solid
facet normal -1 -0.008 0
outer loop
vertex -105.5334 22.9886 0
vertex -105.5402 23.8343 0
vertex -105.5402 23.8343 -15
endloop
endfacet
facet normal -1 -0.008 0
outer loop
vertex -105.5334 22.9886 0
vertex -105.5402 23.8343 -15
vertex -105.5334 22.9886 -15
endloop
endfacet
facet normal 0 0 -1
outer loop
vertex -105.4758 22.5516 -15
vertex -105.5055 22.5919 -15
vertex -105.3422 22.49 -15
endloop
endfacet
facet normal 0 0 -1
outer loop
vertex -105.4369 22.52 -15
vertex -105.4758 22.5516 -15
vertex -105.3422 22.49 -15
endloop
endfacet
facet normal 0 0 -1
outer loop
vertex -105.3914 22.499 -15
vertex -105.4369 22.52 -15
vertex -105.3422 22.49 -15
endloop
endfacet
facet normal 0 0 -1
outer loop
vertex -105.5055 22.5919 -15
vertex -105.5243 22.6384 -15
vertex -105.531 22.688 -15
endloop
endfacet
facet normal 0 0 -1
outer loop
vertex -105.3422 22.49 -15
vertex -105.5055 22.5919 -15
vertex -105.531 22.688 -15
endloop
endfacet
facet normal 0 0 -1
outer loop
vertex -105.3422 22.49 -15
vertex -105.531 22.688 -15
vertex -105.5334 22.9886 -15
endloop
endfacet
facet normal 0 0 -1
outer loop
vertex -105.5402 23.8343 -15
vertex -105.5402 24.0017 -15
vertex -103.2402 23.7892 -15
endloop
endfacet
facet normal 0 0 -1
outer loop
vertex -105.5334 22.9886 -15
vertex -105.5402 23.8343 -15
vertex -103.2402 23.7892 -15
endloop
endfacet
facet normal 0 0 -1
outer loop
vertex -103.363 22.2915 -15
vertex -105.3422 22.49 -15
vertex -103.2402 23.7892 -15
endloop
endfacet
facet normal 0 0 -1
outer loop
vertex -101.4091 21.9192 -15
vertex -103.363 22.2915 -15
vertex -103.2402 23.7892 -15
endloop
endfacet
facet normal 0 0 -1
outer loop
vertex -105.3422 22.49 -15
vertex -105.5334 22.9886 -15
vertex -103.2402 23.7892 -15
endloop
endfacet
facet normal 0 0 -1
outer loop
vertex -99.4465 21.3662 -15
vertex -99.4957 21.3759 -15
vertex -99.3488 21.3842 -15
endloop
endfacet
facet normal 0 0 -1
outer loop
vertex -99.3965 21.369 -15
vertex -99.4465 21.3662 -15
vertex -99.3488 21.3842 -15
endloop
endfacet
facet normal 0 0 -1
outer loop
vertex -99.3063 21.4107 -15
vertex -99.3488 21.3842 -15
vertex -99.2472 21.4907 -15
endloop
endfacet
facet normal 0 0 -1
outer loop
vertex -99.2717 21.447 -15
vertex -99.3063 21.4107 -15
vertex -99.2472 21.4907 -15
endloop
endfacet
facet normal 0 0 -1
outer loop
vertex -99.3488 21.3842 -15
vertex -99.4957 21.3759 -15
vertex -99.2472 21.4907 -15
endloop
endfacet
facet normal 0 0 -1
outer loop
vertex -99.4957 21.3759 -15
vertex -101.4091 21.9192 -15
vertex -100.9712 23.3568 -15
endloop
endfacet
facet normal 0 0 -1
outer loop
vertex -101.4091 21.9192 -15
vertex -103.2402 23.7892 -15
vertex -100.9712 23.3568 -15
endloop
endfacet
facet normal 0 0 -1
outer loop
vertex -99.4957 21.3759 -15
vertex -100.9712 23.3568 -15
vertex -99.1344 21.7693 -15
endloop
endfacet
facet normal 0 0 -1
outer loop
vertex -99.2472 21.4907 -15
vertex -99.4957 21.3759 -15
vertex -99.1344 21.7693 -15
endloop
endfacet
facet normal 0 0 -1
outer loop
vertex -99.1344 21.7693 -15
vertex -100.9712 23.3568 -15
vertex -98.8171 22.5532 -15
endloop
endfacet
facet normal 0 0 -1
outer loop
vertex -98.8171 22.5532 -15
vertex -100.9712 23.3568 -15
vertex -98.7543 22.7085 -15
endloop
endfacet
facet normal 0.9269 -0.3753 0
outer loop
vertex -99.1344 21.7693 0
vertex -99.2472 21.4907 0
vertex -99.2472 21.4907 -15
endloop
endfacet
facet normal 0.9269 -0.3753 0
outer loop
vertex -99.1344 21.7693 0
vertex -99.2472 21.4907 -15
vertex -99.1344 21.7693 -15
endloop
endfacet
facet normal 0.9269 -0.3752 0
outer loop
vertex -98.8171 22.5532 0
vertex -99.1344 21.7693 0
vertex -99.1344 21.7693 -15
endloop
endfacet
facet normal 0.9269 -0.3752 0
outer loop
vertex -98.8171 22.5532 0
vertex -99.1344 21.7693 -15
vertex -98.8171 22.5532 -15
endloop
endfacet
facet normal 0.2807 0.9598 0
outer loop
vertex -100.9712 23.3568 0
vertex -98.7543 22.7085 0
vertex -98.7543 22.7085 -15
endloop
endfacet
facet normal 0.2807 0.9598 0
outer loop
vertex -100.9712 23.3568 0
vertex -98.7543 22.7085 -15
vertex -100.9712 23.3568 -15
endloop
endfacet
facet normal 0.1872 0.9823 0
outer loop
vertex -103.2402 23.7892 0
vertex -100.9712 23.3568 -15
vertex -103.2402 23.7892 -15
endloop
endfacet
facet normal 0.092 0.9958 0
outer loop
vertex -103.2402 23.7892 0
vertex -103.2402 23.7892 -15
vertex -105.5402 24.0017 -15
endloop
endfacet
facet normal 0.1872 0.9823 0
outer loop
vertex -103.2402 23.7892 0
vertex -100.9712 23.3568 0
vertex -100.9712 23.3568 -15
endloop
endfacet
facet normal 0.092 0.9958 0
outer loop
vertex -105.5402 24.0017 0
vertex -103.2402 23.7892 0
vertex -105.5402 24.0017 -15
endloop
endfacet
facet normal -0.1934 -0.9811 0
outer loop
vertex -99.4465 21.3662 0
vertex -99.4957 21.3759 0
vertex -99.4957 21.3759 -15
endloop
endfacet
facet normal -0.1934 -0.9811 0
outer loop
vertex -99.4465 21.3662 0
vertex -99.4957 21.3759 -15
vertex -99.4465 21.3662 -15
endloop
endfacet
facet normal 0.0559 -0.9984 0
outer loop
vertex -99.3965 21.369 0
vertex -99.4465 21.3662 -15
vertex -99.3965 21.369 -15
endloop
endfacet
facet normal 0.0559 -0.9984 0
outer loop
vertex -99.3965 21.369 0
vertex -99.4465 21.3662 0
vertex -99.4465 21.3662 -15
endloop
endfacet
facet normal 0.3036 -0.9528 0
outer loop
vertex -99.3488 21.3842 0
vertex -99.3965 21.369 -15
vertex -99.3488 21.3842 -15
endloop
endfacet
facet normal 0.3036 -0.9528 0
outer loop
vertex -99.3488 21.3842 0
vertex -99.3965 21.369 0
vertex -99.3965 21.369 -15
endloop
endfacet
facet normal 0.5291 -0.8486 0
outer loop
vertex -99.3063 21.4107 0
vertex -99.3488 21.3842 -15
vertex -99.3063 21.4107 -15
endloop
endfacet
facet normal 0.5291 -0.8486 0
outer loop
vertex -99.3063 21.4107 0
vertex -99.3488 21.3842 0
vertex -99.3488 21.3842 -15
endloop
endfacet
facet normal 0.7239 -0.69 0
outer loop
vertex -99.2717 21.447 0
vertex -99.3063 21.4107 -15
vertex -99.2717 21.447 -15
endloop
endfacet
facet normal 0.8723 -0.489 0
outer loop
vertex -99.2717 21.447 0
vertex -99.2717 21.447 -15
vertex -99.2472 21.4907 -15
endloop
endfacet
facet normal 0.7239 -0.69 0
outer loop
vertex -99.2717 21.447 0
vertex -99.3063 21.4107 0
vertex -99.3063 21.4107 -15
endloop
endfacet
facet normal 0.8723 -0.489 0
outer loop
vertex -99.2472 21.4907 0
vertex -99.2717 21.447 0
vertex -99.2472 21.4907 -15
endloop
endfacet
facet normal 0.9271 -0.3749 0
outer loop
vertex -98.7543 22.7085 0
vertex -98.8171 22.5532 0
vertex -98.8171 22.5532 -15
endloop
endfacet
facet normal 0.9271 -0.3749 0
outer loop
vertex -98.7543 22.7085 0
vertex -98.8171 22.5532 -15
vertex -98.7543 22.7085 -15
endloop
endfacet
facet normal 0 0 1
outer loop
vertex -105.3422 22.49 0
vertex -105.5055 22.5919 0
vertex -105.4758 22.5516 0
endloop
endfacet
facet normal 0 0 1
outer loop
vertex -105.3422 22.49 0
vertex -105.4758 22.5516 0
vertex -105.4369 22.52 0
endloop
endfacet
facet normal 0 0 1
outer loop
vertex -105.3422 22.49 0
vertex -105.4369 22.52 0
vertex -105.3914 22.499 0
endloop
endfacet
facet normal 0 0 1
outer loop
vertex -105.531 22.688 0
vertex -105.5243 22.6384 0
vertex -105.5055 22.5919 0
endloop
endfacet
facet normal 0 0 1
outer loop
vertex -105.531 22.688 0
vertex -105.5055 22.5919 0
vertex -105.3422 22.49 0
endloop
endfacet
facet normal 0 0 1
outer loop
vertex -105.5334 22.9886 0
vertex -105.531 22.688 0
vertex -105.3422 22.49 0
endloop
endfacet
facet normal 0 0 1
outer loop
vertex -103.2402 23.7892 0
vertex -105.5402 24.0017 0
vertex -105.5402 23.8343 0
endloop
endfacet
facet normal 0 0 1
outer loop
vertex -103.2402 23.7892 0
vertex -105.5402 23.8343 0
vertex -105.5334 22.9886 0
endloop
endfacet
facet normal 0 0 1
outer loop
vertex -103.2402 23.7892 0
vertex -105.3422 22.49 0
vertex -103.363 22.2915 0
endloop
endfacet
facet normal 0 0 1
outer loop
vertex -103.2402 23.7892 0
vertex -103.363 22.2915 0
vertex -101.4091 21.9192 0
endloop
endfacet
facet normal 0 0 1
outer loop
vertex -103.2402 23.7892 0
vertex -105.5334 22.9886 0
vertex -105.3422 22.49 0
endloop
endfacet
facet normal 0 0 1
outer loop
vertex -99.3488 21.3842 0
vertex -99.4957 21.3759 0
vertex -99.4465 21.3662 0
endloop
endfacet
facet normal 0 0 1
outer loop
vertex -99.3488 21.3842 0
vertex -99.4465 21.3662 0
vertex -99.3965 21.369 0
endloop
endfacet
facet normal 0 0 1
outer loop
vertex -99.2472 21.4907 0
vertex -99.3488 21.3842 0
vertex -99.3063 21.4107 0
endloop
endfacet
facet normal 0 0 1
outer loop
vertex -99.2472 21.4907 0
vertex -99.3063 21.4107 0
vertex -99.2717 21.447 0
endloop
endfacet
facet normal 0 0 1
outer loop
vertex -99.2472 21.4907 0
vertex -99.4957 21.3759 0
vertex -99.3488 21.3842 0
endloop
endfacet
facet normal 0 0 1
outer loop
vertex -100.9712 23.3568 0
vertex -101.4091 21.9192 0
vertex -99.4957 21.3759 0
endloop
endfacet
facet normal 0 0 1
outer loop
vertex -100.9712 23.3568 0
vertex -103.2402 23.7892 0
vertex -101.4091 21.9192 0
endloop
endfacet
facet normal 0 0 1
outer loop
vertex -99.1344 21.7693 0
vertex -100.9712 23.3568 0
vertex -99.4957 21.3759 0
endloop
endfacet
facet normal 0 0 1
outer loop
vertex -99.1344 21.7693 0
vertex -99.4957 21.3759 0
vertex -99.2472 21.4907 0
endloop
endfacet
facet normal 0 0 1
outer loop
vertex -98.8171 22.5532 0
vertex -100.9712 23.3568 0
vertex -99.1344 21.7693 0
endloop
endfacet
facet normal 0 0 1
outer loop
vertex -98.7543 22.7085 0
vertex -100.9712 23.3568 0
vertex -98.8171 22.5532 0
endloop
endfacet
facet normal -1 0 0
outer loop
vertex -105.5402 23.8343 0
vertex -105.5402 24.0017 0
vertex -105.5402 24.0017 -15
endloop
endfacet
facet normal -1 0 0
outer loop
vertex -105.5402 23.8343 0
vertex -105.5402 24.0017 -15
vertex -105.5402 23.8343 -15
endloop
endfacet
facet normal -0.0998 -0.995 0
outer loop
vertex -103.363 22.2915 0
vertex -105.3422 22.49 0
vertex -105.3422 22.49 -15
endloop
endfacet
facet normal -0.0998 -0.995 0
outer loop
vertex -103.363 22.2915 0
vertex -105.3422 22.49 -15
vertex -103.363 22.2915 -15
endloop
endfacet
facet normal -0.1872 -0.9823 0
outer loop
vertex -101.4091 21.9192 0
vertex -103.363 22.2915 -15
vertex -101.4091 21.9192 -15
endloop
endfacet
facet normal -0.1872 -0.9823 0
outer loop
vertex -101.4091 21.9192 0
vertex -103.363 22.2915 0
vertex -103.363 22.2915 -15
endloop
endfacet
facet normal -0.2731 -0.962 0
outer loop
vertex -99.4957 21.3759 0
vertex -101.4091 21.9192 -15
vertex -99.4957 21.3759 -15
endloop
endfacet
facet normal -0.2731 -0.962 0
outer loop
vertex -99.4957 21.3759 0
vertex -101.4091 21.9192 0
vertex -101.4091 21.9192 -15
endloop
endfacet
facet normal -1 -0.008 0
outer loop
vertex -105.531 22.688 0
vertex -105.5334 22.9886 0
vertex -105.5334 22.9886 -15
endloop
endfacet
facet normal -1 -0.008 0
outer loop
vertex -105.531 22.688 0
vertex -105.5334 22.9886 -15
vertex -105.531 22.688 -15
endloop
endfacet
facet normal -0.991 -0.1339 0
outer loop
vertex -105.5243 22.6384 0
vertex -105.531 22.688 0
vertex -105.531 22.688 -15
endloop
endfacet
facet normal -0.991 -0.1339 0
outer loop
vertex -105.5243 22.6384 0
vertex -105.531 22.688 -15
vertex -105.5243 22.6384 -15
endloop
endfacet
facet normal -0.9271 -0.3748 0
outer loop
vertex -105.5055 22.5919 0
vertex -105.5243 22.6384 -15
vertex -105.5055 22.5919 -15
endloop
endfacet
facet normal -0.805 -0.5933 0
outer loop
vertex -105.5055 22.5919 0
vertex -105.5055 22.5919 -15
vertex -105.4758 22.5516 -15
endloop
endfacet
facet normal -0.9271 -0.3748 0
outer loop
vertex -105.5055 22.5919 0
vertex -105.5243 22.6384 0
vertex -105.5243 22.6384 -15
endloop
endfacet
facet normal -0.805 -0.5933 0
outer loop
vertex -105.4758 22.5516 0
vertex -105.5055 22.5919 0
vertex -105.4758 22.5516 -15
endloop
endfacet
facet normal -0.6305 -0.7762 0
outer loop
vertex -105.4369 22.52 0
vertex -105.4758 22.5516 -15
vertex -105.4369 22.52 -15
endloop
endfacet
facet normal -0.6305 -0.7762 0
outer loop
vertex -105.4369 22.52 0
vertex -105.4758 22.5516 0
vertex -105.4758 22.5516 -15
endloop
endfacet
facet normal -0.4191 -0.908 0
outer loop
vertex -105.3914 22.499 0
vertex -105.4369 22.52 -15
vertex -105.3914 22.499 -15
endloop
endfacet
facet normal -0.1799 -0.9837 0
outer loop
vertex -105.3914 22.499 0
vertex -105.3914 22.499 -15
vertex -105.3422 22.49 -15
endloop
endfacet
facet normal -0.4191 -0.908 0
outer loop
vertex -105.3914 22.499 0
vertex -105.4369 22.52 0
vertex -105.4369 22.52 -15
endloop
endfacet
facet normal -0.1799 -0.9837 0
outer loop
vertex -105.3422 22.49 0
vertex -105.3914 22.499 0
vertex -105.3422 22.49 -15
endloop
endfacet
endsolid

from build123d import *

# Parameters (mm, degrees)
BOSS_EXTRUDE1_DEPTH = 15


with BuildPart() as part:
    # Sketch1 → Boss-Extrude1 (new body)
    with BuildSketch(Plane.XY):
        with BuildLine():
            Line((-99.134442938, 21.769328519), (-98.817115398, 22.553238929))
            Line((-98.817115398, 22.553238929), (-98.754280528, 22.708463115))
            ThreePointArc((-98.754280528, 22.708463115), (-102.100537724, 23.60025606), (-105.54024369, 24.001696896))
            Line((-105.54024369, 24.001696896), (-105.54024369, 23.834302043))
            Line((-105.54024369, 23.834302043), (-105.533426583, 22.988627268))
            Line((-105.533426583, 22.988627268), (-105.531003444, 22.68803248))
            ThreePointArc((-105.531003444, 22.68803248), (-105.475765577, 22.551638114), (-105.342161912, 22.489955815))
            ThreePointArc((-105.342161912, 22.489955815), (-102.381968354, 22.126893501), (-99.495686711, 21.375935169))
            ThreePointArc((-99.495686711, 21.375935169), (-99.34876179, 21.384163954), (-99.247236895, 21.490687852))
            Line((-99.247236895, 21.490687852), (-99.134442938, 21.769328519))
        make_face()
    extrude(amount=-BOSS_EXTRUDE1_DEPTH)


solid = part.part
